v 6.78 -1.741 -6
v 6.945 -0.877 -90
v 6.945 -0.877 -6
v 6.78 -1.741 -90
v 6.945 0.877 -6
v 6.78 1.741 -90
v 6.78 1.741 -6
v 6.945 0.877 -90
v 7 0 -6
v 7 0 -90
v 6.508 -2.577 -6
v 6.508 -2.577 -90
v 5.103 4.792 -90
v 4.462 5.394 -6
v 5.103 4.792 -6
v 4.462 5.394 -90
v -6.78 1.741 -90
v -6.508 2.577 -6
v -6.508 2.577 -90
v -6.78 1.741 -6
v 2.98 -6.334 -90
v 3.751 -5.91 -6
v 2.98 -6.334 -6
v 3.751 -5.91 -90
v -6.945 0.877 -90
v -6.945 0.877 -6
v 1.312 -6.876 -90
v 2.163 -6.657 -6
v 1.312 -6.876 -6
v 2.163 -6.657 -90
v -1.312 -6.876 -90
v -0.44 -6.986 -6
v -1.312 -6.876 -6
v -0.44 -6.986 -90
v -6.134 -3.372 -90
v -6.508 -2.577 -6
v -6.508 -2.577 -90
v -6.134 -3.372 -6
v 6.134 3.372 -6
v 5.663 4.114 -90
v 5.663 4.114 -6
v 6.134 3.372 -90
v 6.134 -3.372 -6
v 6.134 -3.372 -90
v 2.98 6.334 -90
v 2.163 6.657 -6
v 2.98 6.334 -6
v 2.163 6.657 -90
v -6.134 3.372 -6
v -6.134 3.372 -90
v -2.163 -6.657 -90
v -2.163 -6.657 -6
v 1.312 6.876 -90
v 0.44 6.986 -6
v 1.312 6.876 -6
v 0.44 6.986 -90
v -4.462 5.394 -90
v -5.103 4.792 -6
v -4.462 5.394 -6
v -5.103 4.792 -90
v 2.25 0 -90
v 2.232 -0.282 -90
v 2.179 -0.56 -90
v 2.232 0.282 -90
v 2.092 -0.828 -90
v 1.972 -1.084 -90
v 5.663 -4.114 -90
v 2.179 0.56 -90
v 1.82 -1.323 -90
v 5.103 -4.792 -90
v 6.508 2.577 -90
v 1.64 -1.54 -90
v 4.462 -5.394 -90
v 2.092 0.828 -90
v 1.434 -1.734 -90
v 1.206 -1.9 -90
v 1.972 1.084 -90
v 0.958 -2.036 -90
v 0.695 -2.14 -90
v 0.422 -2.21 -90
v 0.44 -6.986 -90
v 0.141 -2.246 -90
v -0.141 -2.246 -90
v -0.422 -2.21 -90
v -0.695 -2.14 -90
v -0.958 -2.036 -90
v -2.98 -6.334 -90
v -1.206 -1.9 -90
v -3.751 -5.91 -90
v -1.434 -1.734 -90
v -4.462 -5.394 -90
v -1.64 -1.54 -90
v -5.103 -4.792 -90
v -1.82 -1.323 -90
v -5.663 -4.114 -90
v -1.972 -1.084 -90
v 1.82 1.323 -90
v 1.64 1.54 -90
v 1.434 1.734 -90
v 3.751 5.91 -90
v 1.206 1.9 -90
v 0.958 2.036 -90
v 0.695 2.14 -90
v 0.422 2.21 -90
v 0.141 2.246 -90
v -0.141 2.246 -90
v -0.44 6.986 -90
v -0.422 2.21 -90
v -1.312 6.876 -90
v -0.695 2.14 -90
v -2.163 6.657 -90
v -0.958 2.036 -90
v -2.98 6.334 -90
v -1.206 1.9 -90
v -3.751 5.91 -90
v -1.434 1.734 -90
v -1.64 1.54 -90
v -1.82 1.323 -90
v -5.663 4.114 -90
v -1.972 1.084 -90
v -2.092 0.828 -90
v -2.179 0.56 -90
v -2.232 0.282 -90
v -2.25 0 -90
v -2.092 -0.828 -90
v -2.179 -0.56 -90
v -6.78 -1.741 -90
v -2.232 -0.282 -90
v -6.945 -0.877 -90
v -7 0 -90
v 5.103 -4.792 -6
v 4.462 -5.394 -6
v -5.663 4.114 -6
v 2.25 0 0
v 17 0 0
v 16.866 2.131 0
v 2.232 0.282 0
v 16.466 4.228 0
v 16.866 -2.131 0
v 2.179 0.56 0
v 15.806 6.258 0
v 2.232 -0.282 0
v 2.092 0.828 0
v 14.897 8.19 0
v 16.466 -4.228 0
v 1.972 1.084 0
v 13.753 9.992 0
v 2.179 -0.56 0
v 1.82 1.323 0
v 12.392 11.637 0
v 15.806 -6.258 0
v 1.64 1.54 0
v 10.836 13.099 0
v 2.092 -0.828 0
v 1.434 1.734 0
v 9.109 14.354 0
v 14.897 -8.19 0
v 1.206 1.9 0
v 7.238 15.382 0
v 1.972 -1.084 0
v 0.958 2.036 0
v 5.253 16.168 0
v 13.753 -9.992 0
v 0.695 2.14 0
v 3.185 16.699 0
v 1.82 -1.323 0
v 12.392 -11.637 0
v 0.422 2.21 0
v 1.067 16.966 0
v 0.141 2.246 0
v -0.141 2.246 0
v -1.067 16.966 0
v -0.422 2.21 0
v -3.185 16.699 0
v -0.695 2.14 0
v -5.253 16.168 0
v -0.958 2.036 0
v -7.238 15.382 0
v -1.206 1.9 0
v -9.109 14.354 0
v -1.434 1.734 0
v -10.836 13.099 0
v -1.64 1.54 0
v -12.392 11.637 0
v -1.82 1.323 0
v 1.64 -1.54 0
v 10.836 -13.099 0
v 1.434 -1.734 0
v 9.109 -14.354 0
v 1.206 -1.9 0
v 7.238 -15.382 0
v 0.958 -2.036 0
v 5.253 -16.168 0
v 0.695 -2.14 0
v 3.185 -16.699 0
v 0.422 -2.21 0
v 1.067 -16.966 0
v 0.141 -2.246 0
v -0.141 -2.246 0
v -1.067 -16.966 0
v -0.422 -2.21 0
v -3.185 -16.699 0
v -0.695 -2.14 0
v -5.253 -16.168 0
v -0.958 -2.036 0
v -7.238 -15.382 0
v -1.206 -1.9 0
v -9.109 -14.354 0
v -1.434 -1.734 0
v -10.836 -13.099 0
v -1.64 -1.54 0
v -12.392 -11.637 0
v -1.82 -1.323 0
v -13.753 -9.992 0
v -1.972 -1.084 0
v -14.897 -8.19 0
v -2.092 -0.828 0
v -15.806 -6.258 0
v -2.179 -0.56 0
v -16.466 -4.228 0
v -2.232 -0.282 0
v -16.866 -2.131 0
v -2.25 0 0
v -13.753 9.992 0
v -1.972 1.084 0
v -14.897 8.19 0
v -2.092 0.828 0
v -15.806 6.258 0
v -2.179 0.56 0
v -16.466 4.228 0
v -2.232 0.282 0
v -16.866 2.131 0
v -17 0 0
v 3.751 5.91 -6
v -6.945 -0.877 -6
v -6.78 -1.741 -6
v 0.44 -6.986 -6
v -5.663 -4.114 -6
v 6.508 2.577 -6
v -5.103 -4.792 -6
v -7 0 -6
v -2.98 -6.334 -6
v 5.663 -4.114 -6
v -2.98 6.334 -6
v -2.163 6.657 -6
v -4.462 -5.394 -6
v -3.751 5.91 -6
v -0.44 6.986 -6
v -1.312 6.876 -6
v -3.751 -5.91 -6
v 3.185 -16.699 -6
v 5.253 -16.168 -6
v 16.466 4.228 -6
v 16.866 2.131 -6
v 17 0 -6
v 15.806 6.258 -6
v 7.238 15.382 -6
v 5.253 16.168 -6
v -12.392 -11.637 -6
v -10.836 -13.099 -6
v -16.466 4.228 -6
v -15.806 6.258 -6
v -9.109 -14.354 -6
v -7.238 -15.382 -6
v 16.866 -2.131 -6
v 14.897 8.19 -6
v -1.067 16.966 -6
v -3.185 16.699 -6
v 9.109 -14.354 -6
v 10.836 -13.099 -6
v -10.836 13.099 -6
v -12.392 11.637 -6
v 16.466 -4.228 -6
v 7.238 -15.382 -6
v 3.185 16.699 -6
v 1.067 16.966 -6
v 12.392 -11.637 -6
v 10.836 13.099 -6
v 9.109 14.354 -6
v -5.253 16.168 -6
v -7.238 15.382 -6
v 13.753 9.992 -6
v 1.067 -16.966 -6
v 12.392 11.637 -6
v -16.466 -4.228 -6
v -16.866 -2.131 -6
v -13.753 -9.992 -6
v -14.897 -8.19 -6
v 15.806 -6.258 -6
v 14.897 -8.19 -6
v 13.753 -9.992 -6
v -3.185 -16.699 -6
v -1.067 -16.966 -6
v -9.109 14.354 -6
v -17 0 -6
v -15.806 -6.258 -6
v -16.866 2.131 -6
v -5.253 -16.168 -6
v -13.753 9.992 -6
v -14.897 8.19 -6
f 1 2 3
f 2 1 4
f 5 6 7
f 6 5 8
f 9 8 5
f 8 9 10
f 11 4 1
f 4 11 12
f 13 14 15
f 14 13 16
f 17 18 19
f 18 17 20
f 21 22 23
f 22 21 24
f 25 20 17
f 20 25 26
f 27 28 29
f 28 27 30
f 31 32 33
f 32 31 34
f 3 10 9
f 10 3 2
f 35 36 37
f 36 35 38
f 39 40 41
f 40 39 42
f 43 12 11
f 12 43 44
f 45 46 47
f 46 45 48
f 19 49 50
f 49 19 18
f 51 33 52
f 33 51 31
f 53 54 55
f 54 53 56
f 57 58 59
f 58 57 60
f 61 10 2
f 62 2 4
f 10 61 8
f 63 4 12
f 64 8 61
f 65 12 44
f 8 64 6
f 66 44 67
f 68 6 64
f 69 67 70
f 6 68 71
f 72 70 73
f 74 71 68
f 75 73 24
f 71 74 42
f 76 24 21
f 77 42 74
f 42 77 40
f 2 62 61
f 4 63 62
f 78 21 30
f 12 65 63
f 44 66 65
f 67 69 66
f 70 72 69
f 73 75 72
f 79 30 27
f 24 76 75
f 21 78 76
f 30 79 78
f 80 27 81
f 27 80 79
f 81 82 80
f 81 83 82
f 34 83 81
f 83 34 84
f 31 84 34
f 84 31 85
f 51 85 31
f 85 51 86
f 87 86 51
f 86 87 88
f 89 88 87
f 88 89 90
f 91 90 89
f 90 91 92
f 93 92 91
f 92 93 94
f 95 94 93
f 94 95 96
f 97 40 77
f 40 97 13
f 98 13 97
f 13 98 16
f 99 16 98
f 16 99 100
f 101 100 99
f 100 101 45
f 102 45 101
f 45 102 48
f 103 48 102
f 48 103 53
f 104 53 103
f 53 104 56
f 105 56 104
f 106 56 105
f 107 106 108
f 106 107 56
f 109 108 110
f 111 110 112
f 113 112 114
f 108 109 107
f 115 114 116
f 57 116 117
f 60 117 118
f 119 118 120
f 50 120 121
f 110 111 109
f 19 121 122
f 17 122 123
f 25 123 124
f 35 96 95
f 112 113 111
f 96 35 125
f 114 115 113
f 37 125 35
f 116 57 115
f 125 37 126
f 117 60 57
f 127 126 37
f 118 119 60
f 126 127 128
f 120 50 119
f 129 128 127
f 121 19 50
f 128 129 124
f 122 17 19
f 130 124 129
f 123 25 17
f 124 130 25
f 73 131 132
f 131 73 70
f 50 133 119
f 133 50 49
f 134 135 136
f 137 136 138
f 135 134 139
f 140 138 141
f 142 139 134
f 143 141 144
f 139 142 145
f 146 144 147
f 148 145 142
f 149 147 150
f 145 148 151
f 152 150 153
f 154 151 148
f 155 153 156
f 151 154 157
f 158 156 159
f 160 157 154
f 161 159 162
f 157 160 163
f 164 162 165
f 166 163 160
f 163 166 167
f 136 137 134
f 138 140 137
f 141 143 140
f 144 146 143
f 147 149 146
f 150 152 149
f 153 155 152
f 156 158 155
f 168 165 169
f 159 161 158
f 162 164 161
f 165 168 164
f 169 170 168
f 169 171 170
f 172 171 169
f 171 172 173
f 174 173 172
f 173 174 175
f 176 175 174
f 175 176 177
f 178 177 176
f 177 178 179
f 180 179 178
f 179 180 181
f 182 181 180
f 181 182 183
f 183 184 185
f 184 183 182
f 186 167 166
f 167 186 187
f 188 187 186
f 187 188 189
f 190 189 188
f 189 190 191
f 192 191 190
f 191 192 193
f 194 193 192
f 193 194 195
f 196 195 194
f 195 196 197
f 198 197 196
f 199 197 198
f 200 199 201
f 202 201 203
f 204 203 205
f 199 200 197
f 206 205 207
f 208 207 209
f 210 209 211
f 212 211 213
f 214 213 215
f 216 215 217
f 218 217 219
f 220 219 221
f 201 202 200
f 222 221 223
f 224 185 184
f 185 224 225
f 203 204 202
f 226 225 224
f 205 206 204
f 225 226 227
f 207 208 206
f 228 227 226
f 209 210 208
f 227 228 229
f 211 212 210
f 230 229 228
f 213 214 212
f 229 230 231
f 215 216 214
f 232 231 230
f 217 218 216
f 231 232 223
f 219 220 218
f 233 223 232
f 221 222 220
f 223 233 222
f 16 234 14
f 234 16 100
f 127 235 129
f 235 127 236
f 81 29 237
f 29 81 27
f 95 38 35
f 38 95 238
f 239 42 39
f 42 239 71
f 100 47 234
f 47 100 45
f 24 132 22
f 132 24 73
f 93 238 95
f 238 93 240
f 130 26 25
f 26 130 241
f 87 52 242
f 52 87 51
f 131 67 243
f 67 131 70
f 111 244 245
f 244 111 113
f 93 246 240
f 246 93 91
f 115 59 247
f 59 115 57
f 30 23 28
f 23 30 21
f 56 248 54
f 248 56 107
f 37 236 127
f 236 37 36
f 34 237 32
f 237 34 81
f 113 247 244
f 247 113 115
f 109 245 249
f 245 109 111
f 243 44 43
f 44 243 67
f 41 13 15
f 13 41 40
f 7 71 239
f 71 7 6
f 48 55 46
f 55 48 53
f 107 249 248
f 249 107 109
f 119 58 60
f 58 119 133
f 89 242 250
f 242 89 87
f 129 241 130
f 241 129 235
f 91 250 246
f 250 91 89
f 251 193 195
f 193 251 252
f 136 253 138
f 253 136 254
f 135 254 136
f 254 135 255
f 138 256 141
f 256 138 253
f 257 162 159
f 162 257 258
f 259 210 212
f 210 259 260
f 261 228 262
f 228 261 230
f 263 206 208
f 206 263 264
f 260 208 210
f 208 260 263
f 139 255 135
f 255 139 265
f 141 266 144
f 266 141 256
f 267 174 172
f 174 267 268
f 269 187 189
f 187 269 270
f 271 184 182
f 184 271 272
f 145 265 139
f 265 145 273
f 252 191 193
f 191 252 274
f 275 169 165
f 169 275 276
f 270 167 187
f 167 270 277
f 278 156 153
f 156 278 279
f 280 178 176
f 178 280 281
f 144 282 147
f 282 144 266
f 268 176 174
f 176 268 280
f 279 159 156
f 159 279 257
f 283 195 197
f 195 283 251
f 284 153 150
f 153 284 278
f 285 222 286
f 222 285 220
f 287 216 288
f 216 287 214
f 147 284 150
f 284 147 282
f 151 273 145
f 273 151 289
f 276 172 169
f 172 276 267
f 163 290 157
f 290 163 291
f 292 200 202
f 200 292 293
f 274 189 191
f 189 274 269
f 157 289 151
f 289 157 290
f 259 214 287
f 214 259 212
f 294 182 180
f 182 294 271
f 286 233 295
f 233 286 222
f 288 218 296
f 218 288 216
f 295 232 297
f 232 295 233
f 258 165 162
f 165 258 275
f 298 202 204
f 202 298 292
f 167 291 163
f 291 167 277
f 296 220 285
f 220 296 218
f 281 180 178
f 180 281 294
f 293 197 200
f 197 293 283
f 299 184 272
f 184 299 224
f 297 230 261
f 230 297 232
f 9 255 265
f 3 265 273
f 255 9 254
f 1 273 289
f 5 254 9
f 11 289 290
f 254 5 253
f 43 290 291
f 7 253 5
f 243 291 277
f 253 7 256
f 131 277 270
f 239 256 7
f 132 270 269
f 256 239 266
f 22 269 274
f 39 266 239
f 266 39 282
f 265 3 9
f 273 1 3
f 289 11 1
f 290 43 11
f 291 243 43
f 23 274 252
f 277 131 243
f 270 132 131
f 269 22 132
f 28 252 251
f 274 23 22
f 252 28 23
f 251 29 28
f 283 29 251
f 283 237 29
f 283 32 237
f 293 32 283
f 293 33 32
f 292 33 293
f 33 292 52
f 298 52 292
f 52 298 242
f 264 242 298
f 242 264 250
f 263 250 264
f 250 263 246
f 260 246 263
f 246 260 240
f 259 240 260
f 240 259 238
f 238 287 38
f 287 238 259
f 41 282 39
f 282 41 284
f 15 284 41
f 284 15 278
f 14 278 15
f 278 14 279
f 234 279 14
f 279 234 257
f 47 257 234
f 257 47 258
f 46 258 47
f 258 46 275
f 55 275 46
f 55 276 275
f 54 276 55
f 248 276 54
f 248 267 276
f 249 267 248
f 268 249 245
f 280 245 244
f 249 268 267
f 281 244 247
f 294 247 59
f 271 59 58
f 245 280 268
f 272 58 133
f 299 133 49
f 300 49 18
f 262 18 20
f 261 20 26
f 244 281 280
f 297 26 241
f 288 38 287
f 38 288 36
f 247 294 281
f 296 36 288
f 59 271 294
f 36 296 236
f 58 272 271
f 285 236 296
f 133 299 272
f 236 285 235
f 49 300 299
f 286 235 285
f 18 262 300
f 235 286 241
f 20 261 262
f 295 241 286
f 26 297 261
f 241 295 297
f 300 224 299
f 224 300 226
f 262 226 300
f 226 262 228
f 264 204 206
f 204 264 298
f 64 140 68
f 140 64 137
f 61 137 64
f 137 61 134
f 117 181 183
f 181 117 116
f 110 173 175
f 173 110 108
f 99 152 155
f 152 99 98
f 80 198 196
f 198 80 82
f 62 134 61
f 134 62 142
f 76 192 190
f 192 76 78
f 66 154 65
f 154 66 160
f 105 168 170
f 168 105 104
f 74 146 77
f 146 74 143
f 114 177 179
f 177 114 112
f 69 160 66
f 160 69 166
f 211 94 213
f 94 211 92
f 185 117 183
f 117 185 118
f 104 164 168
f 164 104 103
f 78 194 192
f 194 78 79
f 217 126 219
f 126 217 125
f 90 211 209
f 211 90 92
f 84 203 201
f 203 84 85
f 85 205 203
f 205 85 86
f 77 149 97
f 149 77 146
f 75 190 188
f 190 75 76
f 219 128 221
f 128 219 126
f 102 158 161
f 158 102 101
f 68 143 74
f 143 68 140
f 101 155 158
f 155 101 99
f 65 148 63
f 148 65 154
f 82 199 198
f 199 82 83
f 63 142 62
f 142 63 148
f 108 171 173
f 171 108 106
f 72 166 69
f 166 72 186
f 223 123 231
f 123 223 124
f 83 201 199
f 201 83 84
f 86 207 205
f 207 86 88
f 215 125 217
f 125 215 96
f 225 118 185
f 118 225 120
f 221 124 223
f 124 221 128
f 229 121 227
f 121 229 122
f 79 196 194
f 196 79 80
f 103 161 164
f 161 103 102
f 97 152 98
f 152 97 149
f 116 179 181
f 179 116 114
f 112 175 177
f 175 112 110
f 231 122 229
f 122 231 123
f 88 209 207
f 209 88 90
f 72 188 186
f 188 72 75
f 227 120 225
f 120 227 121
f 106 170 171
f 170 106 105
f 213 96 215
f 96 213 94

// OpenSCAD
$fn = 50;


difference() {
	union() {
		translate(v = [0, 0, -90.0000000000]) {
			cylinder(h = 90, r = 7.0000000000);
		}
		translate(v = [0, 0, -6.0000000000]) {
			cylinder(h = 6, r = 17.0000000000);
		}
	}
	union() {
		#translate(v = [0, 0, -90]) {
			cylinder(h = 90, r = 2.2500000000);
		}
	}
}
